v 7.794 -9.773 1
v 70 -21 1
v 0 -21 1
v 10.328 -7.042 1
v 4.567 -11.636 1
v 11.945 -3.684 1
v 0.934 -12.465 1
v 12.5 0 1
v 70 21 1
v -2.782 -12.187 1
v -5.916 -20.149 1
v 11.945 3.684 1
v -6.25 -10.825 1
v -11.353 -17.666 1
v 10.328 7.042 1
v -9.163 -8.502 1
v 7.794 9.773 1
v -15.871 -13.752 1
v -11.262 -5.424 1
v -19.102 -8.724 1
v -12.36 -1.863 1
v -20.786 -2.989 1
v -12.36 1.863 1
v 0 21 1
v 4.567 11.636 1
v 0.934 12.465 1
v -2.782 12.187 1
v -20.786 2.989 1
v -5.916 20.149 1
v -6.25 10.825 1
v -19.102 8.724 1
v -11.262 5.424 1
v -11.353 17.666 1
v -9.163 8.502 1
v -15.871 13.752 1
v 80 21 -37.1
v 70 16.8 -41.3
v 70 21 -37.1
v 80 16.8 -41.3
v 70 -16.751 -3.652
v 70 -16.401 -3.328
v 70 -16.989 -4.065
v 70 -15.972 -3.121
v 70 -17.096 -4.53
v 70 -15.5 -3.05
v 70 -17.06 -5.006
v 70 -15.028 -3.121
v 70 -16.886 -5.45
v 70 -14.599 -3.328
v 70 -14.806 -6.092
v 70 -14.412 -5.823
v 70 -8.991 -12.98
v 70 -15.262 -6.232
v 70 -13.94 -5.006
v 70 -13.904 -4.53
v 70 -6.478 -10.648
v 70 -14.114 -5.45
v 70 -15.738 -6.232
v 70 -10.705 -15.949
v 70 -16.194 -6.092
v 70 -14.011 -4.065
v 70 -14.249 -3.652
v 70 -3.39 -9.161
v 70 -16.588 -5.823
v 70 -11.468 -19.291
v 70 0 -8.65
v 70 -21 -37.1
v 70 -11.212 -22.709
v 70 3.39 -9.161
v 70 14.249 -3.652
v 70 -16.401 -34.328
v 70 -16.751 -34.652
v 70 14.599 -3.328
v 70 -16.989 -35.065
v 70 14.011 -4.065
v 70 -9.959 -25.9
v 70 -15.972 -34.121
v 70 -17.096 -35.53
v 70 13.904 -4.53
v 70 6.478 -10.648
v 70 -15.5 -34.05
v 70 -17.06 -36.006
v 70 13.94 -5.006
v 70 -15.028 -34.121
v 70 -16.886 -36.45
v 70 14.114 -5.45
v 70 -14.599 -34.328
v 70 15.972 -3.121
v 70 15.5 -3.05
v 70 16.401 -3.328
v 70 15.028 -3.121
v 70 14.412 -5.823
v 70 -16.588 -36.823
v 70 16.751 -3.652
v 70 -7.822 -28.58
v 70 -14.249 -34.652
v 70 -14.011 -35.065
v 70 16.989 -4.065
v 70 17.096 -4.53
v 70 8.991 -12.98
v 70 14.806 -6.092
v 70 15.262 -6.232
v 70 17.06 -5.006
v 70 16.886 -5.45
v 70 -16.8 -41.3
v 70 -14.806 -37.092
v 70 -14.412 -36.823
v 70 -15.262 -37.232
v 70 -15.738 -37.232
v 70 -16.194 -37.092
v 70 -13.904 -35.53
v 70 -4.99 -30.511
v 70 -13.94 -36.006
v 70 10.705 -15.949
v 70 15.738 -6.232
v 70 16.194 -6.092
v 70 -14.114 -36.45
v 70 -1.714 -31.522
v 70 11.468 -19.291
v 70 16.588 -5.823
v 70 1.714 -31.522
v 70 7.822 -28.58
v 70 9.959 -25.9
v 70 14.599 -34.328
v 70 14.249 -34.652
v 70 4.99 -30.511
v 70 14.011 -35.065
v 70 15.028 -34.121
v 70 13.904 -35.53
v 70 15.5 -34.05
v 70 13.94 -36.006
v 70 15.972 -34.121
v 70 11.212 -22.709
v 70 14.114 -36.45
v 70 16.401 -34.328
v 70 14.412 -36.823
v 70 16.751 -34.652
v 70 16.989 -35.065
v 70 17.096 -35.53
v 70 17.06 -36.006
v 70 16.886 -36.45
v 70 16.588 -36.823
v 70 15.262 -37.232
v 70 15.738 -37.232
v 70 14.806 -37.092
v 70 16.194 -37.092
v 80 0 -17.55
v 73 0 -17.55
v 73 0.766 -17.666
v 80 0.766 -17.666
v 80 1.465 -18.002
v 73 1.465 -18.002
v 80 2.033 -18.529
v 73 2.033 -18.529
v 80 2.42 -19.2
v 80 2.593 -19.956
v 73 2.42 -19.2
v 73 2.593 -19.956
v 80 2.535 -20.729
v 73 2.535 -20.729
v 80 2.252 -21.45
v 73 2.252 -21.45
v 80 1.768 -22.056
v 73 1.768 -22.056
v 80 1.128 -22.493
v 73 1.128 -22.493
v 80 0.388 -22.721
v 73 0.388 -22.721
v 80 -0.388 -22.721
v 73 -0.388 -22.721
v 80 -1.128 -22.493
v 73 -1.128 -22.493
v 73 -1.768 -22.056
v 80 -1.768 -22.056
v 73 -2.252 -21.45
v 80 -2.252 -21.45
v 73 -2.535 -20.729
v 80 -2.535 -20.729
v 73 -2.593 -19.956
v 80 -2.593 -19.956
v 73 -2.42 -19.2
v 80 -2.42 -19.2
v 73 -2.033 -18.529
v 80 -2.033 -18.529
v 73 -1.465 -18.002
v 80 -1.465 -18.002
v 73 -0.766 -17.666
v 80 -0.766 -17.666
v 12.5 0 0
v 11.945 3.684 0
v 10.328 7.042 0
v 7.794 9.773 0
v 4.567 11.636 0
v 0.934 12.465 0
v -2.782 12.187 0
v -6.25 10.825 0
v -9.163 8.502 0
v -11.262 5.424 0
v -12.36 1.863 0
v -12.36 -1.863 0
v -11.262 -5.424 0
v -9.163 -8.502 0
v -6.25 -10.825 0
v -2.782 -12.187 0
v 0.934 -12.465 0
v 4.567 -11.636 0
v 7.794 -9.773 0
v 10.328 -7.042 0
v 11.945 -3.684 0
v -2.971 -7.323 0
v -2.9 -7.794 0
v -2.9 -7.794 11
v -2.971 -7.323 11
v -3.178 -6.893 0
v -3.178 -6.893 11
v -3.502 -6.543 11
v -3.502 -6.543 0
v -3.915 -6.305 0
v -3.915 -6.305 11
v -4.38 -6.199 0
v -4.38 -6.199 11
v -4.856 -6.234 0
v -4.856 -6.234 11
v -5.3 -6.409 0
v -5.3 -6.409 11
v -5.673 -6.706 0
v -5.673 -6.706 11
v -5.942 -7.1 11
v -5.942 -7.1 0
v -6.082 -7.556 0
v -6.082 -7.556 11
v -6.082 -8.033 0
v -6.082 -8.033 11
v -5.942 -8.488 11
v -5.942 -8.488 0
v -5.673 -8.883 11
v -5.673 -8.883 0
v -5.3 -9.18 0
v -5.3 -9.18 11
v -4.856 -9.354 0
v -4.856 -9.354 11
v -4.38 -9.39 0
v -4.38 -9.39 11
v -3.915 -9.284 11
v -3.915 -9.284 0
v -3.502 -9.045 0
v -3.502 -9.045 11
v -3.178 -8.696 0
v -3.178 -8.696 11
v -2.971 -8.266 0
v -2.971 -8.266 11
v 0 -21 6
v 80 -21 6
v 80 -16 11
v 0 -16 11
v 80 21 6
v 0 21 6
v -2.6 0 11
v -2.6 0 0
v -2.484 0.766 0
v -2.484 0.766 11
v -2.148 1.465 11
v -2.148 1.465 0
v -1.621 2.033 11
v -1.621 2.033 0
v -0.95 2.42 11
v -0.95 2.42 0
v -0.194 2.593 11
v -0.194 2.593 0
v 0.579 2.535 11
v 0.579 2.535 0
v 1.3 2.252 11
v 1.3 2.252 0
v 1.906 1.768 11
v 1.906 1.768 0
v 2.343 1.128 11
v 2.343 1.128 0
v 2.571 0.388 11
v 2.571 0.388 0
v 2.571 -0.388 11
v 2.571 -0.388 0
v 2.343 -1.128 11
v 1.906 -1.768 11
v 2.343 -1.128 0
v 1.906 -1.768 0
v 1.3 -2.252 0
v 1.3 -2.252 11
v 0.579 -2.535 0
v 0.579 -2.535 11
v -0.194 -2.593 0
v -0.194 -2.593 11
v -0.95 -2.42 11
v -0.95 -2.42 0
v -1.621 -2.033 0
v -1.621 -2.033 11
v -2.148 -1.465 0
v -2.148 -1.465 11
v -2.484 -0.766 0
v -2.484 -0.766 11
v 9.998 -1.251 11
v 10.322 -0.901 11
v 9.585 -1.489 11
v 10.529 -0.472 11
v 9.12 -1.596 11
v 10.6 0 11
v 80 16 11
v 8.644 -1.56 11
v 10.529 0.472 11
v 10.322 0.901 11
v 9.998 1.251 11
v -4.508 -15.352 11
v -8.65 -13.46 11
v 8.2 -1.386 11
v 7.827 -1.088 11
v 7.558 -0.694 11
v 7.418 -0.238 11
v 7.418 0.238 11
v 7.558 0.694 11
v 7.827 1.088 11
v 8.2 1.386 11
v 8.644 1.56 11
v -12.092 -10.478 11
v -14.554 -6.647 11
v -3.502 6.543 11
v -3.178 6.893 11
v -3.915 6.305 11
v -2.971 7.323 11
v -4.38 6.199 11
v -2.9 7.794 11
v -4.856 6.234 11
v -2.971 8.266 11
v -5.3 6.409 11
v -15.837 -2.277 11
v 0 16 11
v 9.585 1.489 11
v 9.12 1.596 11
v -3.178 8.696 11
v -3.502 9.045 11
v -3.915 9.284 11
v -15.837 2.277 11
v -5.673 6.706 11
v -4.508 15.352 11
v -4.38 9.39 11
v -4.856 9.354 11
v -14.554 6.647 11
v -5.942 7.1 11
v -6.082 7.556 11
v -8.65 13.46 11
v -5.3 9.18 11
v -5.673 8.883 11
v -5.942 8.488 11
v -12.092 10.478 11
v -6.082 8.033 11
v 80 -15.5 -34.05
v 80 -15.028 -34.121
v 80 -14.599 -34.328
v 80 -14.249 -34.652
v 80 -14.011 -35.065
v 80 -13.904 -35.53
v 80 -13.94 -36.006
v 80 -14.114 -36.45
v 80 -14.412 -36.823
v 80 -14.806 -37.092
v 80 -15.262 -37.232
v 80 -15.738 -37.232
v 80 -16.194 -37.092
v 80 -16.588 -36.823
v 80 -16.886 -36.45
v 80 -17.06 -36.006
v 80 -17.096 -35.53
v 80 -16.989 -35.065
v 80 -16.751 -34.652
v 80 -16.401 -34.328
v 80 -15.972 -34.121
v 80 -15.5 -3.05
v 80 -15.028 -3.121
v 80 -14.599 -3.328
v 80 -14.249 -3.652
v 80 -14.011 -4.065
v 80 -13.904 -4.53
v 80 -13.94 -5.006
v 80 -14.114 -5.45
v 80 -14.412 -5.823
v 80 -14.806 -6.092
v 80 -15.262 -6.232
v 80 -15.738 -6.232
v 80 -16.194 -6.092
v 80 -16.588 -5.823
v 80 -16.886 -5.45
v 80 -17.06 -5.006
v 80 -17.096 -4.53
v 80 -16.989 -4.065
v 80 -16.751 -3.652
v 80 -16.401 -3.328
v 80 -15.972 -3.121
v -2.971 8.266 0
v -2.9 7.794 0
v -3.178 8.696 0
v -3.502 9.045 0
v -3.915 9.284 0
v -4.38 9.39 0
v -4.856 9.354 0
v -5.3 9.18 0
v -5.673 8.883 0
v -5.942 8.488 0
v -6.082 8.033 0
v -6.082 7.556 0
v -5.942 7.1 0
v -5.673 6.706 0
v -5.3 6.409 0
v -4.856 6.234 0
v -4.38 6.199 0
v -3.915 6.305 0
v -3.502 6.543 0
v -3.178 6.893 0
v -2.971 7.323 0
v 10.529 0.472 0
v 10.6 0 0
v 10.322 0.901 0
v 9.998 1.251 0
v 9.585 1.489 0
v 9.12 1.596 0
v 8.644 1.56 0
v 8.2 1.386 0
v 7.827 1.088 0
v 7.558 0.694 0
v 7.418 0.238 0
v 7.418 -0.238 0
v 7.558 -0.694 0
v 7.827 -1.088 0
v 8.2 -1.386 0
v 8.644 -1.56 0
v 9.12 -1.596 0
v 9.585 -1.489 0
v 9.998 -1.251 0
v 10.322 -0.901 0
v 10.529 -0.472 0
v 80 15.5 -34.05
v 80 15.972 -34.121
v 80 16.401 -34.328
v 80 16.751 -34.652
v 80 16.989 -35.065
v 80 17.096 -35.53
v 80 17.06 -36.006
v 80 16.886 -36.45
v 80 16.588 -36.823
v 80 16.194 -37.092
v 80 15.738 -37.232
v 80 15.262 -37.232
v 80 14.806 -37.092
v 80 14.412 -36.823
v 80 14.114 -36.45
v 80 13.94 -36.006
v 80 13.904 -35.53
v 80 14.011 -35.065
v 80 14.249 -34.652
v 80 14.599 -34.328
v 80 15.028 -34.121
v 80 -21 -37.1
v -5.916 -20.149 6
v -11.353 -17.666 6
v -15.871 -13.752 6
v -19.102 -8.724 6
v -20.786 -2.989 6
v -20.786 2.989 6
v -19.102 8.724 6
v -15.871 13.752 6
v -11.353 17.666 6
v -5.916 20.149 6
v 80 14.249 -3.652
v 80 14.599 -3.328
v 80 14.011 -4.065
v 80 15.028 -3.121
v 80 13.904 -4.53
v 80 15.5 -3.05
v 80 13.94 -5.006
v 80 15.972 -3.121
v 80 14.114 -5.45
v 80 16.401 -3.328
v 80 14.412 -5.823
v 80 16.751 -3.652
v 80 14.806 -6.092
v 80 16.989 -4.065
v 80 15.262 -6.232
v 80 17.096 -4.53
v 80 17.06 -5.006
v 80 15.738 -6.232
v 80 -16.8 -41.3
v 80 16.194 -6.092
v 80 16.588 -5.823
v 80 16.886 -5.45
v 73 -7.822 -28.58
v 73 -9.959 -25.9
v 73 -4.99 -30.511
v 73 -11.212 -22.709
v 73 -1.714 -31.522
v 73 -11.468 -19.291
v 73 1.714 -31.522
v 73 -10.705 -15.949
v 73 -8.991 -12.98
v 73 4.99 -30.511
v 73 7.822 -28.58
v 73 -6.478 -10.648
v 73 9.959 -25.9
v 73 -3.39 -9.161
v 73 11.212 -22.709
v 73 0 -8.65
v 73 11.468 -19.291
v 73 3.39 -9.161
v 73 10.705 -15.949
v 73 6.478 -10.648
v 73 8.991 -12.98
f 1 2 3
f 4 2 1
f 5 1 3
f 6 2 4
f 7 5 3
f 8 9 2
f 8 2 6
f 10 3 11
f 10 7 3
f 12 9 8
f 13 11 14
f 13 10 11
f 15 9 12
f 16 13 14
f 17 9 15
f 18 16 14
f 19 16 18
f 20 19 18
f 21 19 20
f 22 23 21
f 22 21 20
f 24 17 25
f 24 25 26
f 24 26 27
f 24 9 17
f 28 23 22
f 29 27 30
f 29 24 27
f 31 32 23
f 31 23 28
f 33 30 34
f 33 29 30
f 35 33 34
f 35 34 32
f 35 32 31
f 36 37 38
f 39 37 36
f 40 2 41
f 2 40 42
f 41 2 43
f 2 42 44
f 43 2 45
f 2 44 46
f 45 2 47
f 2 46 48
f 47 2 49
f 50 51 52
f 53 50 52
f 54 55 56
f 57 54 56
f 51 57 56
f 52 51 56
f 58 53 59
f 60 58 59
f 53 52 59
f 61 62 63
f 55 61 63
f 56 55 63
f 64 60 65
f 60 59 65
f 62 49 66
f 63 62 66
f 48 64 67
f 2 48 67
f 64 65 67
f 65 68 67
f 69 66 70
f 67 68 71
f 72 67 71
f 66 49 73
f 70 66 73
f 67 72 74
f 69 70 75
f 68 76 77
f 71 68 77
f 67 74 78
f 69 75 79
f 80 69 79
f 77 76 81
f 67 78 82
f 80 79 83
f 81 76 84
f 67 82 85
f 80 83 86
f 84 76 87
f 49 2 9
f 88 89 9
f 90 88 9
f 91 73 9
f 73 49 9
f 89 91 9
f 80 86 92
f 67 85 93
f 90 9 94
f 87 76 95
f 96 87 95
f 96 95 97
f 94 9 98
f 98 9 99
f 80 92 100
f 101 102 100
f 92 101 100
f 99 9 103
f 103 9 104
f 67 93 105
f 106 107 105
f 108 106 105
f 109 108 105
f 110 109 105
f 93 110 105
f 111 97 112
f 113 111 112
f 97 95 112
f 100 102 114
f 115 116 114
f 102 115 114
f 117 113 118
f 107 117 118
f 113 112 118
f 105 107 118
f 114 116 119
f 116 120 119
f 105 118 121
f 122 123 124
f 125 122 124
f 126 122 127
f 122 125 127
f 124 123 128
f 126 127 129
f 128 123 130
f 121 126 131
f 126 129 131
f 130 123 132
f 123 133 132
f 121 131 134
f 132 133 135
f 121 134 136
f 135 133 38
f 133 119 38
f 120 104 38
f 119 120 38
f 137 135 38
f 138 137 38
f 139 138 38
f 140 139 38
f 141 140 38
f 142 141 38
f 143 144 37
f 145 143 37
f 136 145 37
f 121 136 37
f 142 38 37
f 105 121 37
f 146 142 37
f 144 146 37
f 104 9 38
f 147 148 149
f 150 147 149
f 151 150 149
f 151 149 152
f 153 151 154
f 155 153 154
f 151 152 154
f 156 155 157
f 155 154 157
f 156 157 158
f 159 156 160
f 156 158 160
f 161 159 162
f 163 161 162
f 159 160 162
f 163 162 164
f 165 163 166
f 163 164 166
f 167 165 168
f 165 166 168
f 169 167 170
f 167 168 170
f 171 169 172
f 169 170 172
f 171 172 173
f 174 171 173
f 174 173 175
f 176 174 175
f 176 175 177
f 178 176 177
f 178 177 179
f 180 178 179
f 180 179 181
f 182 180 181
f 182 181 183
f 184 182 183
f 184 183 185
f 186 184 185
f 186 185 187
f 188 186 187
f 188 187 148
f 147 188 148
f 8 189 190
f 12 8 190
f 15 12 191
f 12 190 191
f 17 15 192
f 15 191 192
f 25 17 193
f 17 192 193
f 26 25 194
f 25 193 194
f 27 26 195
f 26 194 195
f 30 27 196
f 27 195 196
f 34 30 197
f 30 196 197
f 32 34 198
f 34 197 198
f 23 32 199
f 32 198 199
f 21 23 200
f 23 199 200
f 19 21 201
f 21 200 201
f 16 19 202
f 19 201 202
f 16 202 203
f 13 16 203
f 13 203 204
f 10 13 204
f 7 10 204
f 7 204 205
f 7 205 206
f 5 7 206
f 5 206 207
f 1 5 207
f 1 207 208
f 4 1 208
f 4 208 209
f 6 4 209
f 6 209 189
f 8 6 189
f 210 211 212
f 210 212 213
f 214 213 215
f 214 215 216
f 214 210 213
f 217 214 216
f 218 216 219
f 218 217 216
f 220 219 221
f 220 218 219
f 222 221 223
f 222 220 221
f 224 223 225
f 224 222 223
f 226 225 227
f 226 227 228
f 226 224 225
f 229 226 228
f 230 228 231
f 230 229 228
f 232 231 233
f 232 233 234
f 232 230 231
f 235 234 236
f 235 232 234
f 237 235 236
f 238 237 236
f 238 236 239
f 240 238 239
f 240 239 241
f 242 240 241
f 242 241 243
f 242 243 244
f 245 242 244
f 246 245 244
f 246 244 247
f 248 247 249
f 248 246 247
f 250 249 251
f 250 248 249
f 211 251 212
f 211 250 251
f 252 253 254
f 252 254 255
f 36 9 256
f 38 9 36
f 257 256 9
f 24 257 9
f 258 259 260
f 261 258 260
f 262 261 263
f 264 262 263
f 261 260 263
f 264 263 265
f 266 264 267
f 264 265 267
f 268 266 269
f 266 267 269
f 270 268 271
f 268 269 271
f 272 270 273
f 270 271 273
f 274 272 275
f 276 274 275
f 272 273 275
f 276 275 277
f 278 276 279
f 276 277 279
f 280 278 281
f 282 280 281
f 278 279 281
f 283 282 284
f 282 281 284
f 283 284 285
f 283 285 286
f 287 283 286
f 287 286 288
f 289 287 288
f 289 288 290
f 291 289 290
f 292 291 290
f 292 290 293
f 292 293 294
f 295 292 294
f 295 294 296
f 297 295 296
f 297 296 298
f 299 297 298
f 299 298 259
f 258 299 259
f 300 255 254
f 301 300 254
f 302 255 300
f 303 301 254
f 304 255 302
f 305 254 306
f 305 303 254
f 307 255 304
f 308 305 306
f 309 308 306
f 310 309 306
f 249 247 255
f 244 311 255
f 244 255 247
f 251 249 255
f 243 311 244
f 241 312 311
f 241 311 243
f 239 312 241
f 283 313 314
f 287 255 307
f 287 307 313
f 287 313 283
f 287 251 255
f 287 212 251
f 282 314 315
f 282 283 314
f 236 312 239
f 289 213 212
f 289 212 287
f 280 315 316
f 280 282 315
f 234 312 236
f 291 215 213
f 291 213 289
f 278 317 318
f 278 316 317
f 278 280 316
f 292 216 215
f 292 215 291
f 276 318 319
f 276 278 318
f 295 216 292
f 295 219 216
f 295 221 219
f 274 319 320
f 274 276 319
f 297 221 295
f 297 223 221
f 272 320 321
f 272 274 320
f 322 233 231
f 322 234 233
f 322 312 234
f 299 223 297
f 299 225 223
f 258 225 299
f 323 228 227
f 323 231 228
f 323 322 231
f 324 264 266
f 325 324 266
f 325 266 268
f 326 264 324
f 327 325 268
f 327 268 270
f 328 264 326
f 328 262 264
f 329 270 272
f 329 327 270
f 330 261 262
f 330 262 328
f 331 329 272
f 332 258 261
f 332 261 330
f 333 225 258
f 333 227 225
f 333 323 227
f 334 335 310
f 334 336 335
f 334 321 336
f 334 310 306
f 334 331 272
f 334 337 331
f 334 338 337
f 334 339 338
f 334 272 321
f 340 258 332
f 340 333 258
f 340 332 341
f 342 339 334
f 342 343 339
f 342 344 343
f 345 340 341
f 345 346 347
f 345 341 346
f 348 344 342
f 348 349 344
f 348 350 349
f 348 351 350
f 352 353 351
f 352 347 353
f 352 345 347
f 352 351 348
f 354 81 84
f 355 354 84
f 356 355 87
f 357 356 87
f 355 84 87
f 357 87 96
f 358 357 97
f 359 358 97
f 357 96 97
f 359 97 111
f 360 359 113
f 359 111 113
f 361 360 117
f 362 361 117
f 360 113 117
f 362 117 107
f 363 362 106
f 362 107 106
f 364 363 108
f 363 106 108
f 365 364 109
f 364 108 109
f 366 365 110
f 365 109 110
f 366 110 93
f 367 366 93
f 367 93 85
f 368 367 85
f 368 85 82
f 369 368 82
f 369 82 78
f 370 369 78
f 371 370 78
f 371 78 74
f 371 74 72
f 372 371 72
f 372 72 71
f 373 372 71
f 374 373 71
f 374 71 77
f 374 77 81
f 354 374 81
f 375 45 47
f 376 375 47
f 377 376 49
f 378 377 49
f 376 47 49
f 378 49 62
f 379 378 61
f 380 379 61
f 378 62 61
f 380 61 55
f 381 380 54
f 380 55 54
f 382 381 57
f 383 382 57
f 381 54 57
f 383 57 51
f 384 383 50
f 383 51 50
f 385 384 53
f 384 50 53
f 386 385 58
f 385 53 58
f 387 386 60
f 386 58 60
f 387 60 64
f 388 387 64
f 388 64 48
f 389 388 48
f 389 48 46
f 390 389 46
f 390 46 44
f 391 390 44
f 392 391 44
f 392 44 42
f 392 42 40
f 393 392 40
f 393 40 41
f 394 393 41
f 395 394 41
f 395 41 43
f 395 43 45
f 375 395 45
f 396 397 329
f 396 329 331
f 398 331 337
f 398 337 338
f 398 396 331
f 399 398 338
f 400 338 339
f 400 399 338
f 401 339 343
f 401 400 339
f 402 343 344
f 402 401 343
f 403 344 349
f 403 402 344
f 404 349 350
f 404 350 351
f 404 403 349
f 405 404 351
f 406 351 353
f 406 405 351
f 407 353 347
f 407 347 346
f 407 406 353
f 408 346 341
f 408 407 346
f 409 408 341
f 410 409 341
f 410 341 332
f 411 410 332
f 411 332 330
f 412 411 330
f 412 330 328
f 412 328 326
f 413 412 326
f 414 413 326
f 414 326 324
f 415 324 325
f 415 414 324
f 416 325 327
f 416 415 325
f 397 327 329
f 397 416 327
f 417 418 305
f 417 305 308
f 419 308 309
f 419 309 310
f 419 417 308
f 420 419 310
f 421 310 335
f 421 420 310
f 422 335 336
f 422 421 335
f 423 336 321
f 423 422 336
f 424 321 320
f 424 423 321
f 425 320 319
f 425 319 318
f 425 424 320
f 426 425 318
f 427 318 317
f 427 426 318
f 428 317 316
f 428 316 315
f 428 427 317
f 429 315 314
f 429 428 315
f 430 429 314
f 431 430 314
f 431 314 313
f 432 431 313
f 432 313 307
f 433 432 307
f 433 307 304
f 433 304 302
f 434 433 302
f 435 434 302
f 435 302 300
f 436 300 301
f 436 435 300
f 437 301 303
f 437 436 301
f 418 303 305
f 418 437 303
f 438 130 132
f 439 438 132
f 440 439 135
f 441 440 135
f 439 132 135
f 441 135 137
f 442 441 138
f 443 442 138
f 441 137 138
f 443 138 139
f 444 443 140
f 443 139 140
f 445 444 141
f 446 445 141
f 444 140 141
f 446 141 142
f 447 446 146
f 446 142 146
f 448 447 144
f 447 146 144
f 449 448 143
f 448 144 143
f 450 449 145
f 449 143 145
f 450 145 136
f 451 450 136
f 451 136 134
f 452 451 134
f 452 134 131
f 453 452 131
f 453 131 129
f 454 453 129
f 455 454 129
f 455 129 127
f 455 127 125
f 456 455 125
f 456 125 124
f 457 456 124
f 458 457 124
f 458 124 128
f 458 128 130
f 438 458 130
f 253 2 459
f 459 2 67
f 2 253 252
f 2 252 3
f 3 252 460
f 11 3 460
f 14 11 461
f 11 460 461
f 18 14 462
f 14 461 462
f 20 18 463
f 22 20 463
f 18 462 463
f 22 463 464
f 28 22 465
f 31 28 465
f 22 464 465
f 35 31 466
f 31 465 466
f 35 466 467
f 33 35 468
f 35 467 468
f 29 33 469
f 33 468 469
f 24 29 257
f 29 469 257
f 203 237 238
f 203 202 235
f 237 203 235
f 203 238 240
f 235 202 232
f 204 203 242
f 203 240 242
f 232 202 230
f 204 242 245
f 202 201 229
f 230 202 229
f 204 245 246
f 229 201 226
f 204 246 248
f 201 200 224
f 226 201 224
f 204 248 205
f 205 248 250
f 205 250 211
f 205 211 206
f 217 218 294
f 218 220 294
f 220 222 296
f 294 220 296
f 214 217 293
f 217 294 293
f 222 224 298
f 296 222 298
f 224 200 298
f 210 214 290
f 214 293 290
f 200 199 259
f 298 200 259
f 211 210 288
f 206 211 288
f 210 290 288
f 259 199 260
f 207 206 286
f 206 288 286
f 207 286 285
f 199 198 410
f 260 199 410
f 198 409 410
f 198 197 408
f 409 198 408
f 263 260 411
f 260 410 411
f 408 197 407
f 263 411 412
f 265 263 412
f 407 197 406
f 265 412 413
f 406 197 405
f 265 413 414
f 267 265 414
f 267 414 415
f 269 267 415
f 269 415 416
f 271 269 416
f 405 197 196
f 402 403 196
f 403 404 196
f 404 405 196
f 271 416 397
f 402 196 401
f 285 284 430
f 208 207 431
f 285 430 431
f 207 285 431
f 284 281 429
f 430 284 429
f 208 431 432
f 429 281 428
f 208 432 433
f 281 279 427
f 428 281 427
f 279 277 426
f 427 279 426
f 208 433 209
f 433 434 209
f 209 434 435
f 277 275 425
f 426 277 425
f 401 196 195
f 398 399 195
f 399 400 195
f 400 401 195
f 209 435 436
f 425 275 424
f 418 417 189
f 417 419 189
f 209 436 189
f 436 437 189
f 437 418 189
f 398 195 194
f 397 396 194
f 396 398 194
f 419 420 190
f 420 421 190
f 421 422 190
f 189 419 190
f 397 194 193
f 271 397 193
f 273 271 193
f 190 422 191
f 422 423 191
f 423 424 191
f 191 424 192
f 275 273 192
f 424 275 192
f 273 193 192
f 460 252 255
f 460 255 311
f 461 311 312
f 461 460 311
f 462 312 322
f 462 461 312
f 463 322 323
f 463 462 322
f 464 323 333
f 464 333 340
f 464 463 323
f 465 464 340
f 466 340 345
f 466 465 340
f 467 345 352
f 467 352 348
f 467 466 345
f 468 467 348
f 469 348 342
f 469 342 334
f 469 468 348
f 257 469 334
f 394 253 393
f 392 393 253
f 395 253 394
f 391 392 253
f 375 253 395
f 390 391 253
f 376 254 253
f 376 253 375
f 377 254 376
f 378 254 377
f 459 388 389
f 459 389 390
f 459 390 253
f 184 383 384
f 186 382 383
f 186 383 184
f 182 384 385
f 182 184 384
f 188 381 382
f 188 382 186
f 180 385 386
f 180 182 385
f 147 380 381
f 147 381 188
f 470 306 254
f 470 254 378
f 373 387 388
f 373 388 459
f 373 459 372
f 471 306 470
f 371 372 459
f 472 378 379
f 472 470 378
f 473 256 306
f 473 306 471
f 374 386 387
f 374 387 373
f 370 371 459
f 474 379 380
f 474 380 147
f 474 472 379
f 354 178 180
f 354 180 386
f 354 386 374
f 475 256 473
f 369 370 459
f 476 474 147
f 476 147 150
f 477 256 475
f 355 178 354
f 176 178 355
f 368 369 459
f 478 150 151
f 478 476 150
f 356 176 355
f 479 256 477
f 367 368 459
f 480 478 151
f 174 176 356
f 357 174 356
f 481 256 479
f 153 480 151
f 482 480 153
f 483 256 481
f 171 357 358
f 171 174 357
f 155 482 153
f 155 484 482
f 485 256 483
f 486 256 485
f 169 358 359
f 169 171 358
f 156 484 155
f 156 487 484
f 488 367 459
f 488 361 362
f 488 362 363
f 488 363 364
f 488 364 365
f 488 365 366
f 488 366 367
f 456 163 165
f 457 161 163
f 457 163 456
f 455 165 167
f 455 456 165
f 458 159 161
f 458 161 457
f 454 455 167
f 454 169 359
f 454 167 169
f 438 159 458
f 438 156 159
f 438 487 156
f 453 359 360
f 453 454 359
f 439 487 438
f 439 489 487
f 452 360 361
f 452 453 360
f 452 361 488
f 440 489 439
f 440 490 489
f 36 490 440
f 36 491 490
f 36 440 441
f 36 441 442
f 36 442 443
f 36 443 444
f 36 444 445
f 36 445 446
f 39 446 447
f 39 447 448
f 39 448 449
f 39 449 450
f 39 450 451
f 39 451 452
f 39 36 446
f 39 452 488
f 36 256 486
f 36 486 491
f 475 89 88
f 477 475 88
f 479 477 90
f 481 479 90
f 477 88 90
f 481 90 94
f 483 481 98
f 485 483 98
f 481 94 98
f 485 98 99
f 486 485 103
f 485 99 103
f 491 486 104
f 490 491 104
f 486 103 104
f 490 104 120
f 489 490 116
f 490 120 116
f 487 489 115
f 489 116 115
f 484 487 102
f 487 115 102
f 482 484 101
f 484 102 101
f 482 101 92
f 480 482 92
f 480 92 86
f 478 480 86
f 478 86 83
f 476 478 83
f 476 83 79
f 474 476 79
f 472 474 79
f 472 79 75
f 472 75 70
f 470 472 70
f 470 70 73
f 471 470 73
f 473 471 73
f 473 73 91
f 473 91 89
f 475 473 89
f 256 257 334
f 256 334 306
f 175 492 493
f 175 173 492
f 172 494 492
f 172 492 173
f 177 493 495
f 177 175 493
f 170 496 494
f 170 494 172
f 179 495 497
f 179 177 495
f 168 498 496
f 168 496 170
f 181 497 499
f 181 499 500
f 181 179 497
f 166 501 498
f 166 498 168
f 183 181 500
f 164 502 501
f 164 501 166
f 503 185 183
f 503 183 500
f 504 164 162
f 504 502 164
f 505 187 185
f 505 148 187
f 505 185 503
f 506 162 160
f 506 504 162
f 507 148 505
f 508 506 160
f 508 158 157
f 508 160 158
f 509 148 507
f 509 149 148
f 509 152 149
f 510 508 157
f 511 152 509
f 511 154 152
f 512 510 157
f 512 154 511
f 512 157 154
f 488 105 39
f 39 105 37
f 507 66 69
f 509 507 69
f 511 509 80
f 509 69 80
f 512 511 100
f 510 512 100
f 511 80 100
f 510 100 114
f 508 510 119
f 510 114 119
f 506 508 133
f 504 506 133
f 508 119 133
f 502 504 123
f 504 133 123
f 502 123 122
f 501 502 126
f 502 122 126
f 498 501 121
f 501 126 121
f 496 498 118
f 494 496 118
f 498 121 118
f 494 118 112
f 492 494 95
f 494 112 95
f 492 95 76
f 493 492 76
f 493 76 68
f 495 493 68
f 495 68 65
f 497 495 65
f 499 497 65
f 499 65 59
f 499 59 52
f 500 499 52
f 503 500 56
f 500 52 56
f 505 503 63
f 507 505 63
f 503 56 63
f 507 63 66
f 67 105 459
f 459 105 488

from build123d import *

# Parameters (mm, degrees)
SKETCH_1_R          = 12.5
SKETCH_1_R_2        = 1.6
EXTRUDE_1_DEPTH     = 11
SKETCH_2_R          = 12.5
EXTRUDE_2_DEPTH     = 10
SKETCH_3_W          = 52.3
SKETCH_3_H          = 42
EXTRUDE_3_DEPTH     = 10
SKETCH_6_R          = 2.6
CUT_EXTRUDE_1_DEPTH = 53.3
SKETCH_8_R          = 1.6
SKETCH_8_R_2        = 2.6
CUT_EXTRUDE_3_DEPTH = 11
SKETCH_9_R          = 11.5
CUT_EXTRUDE_4_DEPTH = 3
CHAMFER_1_SIZE      = 5
CHAMFER_2_SIZE      = 4.2


with BuildPart() as part:
    # 草图1 → 凸台-拉伸1 (new body)
    with BuildSketch(Plane.XY):
        Circle(SKETCH_1_R)
        with Locations((9, 0)):
            Circle(SKETCH_1_R_2, mode=Mode.SUBTRACT)
        with Locations((-4.5, -7.794228634)):
            Circle(SKETCH_1_R_2, mode=Mode.SUBTRACT)
        with Locations((-4.5, 7.794228634)):
            Circle(SKETCH_1_R_2, mode=Mode.SUBTRACT)
    extrude(amount=EXTRUDE_1_DEPTH)

    # 草图2 → 凸台-拉伸2 (add)
    with BuildSketch(Plane.XY.offset(11)):
        with BuildLine():
            Line((0, 21), (70, 21))
            Line((70, 21), (70, -21))
            Line((70, -21), (0, -21))
            ThreePointArc((0, -21), (-21, 0), (0, 21))
        make_face()
        Circle(SKETCH_2_R, mode=Mode.SUBTRACT)
    extrude(amount=-EXTRUDE_2_DEPTH)

    # 草图3 → 凸台-拉伸3 (add)
    with BuildSketch(Plane(origin=(70, 0, 0), x_dir=(0, 0, -1), z_dir=(1, 0, 0))):
        with Locations((15.15, 0)):
            Rectangle(SKETCH_3_W, SKETCH_3_H)
    extrude(amount=EXTRUDE_3_DEPTH)

    # 草图6 → 切除-拉伸1 (cut, through all)
    with BuildSketch(Plane(origin=(0, 0, -41.3), x_dir=(-1, 0, 0), z_dir=(0, 0, -1))):
        Circle(SKETCH_6_R)
    extrude(amount=-CUT_EXTRUDE_1_DEPTH, mode=Mode.SUBTRACT)

    # 草图8 → 切除-拉伸3 (cut, through all)
    with BuildSketch(Plane.ZY.offset(-70)):
        with Locations((-35.65, 15.5)):
            Circle(SKETCH_8_R)
        with Locations((-4.65, 15.5)):
            Circle(SKETCH_8_R)
        with Locations((-4.65, -15.5)):
            Circle(SKETCH_8_R)
        with Locations((-35.65, -15.5)):
            Circle(SKETCH_8_R)
        with Locations((-20.15, 0)):
            Circle(SKETCH_8_R_2)
    extrude(amount=-CUT_EXTRUDE_3_DEPTH, mode=Mode.SUBTRACT)

    # 草图9 → 切除-拉伸4 (cut)
    with BuildSketch(Plane.ZY.offset(-70)):
        with Locations((-20.15, 0)):
            Circle(SKETCH_9_R)
    extrude(amount=-CUT_EXTRUDE_4_DEPTH, mode=Mode.SUBTRACT)

    # 倒角1
    chamfer_1_edges = [part.edges().sort_by_distance(p)[0] for p in [
        (-21, 0, 11),
        (40, -21, 11),
        (40, 21, 11),
    ]]
    chamfer(chamfer_1_edges, length=CHAMFER_1_SIZE)

    # 倒角2
    chamfer_2_edges = [part.edges().sort_by_distance(p)[0] for p in [
        (75, -21, -41.3),
        (75, 21, -41.3),
    ]]
    chamfer(chamfer_2_edges, length=CHAMFER_2_SIZE)


solid = part.part
